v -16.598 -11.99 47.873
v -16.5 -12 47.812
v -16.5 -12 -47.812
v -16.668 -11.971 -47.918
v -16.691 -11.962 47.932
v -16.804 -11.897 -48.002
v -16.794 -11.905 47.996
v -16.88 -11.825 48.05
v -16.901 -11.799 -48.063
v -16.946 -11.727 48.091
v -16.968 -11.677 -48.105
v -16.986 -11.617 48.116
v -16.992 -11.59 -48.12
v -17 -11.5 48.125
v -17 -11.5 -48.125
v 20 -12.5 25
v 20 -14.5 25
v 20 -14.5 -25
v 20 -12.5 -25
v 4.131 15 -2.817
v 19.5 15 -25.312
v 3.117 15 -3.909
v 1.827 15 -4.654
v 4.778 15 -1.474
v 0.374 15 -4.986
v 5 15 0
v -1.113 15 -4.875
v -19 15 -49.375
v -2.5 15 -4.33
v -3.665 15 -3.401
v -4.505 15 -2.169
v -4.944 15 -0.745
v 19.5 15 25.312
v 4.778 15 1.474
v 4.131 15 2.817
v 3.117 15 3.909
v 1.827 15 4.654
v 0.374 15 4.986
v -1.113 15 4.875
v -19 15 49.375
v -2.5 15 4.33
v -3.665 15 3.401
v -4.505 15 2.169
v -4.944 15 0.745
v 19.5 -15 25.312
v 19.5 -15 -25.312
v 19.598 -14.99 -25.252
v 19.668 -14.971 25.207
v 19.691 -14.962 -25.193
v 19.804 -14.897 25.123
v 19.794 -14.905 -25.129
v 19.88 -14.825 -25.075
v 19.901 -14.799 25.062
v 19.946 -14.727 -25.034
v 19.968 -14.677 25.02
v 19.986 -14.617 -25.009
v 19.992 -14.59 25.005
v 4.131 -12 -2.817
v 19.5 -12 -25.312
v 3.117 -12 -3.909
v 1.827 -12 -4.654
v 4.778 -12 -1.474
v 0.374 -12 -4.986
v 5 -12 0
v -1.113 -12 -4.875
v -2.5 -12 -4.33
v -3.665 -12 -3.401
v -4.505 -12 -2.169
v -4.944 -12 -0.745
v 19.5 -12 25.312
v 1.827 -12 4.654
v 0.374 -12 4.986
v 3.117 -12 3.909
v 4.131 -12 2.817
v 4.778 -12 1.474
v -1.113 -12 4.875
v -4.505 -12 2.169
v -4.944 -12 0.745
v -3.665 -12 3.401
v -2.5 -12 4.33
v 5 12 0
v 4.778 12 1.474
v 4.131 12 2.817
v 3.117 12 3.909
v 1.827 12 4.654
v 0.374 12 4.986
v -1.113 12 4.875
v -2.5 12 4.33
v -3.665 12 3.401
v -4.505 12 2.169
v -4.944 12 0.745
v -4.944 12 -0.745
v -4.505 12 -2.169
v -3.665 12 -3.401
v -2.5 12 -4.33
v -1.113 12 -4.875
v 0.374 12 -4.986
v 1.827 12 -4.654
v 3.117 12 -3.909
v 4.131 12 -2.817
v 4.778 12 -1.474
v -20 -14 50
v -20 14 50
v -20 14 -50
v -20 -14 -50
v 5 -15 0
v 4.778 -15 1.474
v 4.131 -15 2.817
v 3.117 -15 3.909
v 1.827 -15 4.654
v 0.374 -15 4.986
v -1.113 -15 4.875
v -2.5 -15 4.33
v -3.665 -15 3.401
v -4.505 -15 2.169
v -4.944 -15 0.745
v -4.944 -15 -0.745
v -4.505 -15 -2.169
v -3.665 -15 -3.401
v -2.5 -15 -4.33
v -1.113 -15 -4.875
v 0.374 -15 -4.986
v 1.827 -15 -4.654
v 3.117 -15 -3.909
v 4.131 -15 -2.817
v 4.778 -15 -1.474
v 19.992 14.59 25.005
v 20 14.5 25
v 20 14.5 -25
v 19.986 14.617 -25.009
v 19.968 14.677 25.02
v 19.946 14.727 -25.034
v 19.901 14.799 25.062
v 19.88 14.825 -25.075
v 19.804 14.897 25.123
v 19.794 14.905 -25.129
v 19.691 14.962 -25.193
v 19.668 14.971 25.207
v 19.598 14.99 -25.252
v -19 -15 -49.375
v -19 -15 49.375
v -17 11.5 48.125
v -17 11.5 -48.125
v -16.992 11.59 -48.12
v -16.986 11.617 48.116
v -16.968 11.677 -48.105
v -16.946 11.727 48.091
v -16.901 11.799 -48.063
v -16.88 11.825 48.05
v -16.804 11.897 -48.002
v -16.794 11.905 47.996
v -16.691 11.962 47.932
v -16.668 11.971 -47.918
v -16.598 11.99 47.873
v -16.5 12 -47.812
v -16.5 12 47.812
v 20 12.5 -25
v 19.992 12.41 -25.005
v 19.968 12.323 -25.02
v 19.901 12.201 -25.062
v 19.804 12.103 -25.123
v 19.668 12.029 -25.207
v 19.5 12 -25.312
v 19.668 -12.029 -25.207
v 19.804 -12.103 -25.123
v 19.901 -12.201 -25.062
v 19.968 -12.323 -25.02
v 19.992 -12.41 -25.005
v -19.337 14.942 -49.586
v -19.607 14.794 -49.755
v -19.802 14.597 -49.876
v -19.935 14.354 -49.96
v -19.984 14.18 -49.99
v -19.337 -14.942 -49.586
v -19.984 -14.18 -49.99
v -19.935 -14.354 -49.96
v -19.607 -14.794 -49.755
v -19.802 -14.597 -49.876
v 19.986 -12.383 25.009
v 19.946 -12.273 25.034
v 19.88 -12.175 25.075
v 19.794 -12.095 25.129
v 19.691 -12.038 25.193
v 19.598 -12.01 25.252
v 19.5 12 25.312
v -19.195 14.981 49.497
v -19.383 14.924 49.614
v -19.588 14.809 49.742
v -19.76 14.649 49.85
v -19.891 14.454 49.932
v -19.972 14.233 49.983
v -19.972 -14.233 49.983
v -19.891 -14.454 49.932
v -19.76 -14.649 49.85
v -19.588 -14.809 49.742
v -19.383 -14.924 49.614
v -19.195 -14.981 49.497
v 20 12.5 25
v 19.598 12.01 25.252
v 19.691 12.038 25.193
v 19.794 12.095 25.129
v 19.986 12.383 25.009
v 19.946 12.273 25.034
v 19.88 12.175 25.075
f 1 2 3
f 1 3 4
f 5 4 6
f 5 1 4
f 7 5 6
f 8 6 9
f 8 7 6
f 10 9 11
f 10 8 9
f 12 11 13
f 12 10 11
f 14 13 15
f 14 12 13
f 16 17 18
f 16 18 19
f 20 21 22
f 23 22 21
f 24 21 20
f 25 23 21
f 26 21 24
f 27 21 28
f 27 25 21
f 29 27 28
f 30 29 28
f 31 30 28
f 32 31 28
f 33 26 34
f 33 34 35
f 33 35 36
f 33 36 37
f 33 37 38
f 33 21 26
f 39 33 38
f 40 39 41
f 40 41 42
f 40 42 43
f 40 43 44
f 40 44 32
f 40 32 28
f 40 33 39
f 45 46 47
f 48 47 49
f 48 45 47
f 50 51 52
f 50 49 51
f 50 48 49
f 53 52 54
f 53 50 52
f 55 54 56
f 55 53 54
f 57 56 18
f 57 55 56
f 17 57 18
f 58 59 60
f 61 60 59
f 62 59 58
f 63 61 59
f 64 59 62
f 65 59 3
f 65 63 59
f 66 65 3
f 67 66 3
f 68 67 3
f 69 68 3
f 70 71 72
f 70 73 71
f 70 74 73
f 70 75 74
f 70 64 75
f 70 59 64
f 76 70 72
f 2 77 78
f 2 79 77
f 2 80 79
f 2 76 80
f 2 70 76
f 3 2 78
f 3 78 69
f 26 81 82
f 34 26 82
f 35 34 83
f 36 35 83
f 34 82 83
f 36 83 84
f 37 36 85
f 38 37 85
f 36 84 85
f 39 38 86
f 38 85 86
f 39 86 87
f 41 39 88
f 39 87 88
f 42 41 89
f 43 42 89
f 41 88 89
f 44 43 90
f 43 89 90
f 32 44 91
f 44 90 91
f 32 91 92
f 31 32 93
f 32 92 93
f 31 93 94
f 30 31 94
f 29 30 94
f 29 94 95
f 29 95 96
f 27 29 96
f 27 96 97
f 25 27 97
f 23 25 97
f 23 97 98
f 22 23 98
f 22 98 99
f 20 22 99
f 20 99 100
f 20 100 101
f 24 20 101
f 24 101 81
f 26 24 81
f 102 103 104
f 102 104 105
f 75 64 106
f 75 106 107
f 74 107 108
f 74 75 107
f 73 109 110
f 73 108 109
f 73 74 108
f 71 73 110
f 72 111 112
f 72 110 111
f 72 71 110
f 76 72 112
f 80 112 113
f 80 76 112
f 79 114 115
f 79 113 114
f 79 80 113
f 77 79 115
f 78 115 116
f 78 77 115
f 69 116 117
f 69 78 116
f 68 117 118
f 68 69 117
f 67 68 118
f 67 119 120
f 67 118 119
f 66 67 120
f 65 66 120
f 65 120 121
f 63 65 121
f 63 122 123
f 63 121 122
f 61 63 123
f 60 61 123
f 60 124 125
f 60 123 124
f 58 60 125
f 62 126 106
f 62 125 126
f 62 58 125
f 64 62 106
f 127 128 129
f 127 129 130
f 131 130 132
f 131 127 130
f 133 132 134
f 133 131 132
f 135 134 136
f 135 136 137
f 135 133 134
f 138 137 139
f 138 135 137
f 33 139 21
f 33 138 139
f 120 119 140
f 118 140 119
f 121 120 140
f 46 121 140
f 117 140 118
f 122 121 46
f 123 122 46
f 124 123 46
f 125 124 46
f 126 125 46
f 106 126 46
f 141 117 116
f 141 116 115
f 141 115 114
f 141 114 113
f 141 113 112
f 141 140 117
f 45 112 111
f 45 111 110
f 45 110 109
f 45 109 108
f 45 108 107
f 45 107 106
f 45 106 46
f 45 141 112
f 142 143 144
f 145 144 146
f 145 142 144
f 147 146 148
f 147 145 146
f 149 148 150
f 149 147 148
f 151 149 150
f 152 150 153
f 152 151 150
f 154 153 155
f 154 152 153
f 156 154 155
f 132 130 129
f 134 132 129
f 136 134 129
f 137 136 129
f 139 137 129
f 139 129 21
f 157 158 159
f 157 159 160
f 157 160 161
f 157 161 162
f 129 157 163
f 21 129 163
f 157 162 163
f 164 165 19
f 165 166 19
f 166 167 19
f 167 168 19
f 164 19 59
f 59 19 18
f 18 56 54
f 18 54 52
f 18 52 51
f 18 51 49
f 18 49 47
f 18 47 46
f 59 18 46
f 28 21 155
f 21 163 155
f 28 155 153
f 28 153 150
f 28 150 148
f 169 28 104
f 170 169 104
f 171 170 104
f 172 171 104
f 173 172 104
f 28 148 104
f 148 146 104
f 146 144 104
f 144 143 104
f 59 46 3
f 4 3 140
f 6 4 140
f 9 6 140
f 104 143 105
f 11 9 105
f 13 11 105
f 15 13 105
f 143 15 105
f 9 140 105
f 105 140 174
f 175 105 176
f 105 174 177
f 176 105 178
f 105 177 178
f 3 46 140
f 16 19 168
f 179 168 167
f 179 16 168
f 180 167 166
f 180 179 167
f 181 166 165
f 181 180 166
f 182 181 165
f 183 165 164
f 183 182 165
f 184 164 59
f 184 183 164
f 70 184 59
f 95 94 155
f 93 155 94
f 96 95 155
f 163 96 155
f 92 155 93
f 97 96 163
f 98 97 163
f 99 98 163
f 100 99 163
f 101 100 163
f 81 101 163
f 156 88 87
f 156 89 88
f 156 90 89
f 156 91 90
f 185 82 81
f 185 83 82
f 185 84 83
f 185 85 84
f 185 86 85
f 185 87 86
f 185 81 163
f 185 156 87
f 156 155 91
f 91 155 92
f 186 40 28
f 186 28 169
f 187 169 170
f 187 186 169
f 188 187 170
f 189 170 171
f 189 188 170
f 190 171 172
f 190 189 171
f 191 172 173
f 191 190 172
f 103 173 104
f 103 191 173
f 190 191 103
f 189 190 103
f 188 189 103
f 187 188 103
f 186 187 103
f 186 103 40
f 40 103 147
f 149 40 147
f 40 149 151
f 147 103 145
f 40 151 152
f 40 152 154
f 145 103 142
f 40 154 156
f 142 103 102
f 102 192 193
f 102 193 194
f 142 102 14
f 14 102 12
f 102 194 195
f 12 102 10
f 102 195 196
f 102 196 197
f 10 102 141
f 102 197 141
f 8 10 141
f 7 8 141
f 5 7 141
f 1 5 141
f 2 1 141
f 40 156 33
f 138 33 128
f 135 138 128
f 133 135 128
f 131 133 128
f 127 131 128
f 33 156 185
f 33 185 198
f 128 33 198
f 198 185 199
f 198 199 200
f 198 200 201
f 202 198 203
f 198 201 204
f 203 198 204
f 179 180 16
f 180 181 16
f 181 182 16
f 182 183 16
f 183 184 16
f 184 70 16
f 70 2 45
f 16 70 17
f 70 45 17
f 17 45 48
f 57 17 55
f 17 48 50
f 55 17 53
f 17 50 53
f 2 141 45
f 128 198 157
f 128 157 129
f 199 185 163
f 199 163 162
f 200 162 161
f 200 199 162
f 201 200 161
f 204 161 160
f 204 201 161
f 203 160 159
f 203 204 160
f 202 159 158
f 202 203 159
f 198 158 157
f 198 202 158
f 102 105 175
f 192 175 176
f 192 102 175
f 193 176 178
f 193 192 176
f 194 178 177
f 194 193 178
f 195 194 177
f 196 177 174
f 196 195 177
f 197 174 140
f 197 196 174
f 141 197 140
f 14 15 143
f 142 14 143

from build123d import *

# Parameters (mm, degrees)
F1_DEPTH      = 50
F1_DEPTH_BACK = 50
F2_R          = 5
F3_DEPTH      = 25
F3_DEPTH_BACK = 25


with BuildPart() as f1:
    # F0 (on Top) → F1 (new body, two sides)
    with BuildSketch(Plane.XY) as f1_sk:
        with BuildLine():
            ThreePointArc((20, 14.5), (19.8535533906, 14.8535533906), (19.5, 15))
            Line((19.5, 15), (-19, 15))
            ThreePointArc((-19, 15), (-19.7071067812, 14.7071067812), (-20, 14))
            Line((-20, 14), (-20, -14))
            ThreePointArc((-20, -14), (-19.7071067812, -14.7071067812), (-19, -15))
            Line((-19, -15), (19.5, -15))
            ThreePointArc((19.5, -15), (19.8535533906, -14.8535533906), (20, -14.5))
            Line((20, -14.5), (20, -12.5))
            ThreePointArc((20, -12.5), (19.8535533906, -12.1464466094), (19.5, -12))
            Line((19.5, -12), (-16.5, -12))
            ThreePointArc((-16.5, -12), (-16.8535533906, -11.8535533906), (-17, -11.5))
            Line((-17, -11.5), (-17, 11.5))
            ThreePointArc((-17, 11.5), (-16.8535533906, 11.8535533906), (-16.5, 12))
            Line((-16.5, 12), (19.5, 12))
            ThreePointArc((19.5, 12), (19.8535533906, 12.1464466094), (20, 12.5))
            Line((20, 12.5), (20, 14.5))
        make_face()
    extrude(amount=F1_DEPTH)
    extrude(f1_sk.sketch, amount=-F1_DEPTH_BACK)

    # F2 (on Front) → F3 (cut, two sides)
    with BuildSketch(Plane.XZ) as f3_sk:
        Polygon((20, 50), (-20, 50), (20, 25), align=None)
        Polygon((20, -25), (-20, -50), (20, -50), align=None)
        Circle(F2_R)
    extrude(amount=-F3_DEPTH, mode=Mode.SUBTRACT)
    extrude(f3_sk.sketch, amount=F3_DEPTH_BACK, mode=Mode.SUBTRACT)


solid = f1.part
